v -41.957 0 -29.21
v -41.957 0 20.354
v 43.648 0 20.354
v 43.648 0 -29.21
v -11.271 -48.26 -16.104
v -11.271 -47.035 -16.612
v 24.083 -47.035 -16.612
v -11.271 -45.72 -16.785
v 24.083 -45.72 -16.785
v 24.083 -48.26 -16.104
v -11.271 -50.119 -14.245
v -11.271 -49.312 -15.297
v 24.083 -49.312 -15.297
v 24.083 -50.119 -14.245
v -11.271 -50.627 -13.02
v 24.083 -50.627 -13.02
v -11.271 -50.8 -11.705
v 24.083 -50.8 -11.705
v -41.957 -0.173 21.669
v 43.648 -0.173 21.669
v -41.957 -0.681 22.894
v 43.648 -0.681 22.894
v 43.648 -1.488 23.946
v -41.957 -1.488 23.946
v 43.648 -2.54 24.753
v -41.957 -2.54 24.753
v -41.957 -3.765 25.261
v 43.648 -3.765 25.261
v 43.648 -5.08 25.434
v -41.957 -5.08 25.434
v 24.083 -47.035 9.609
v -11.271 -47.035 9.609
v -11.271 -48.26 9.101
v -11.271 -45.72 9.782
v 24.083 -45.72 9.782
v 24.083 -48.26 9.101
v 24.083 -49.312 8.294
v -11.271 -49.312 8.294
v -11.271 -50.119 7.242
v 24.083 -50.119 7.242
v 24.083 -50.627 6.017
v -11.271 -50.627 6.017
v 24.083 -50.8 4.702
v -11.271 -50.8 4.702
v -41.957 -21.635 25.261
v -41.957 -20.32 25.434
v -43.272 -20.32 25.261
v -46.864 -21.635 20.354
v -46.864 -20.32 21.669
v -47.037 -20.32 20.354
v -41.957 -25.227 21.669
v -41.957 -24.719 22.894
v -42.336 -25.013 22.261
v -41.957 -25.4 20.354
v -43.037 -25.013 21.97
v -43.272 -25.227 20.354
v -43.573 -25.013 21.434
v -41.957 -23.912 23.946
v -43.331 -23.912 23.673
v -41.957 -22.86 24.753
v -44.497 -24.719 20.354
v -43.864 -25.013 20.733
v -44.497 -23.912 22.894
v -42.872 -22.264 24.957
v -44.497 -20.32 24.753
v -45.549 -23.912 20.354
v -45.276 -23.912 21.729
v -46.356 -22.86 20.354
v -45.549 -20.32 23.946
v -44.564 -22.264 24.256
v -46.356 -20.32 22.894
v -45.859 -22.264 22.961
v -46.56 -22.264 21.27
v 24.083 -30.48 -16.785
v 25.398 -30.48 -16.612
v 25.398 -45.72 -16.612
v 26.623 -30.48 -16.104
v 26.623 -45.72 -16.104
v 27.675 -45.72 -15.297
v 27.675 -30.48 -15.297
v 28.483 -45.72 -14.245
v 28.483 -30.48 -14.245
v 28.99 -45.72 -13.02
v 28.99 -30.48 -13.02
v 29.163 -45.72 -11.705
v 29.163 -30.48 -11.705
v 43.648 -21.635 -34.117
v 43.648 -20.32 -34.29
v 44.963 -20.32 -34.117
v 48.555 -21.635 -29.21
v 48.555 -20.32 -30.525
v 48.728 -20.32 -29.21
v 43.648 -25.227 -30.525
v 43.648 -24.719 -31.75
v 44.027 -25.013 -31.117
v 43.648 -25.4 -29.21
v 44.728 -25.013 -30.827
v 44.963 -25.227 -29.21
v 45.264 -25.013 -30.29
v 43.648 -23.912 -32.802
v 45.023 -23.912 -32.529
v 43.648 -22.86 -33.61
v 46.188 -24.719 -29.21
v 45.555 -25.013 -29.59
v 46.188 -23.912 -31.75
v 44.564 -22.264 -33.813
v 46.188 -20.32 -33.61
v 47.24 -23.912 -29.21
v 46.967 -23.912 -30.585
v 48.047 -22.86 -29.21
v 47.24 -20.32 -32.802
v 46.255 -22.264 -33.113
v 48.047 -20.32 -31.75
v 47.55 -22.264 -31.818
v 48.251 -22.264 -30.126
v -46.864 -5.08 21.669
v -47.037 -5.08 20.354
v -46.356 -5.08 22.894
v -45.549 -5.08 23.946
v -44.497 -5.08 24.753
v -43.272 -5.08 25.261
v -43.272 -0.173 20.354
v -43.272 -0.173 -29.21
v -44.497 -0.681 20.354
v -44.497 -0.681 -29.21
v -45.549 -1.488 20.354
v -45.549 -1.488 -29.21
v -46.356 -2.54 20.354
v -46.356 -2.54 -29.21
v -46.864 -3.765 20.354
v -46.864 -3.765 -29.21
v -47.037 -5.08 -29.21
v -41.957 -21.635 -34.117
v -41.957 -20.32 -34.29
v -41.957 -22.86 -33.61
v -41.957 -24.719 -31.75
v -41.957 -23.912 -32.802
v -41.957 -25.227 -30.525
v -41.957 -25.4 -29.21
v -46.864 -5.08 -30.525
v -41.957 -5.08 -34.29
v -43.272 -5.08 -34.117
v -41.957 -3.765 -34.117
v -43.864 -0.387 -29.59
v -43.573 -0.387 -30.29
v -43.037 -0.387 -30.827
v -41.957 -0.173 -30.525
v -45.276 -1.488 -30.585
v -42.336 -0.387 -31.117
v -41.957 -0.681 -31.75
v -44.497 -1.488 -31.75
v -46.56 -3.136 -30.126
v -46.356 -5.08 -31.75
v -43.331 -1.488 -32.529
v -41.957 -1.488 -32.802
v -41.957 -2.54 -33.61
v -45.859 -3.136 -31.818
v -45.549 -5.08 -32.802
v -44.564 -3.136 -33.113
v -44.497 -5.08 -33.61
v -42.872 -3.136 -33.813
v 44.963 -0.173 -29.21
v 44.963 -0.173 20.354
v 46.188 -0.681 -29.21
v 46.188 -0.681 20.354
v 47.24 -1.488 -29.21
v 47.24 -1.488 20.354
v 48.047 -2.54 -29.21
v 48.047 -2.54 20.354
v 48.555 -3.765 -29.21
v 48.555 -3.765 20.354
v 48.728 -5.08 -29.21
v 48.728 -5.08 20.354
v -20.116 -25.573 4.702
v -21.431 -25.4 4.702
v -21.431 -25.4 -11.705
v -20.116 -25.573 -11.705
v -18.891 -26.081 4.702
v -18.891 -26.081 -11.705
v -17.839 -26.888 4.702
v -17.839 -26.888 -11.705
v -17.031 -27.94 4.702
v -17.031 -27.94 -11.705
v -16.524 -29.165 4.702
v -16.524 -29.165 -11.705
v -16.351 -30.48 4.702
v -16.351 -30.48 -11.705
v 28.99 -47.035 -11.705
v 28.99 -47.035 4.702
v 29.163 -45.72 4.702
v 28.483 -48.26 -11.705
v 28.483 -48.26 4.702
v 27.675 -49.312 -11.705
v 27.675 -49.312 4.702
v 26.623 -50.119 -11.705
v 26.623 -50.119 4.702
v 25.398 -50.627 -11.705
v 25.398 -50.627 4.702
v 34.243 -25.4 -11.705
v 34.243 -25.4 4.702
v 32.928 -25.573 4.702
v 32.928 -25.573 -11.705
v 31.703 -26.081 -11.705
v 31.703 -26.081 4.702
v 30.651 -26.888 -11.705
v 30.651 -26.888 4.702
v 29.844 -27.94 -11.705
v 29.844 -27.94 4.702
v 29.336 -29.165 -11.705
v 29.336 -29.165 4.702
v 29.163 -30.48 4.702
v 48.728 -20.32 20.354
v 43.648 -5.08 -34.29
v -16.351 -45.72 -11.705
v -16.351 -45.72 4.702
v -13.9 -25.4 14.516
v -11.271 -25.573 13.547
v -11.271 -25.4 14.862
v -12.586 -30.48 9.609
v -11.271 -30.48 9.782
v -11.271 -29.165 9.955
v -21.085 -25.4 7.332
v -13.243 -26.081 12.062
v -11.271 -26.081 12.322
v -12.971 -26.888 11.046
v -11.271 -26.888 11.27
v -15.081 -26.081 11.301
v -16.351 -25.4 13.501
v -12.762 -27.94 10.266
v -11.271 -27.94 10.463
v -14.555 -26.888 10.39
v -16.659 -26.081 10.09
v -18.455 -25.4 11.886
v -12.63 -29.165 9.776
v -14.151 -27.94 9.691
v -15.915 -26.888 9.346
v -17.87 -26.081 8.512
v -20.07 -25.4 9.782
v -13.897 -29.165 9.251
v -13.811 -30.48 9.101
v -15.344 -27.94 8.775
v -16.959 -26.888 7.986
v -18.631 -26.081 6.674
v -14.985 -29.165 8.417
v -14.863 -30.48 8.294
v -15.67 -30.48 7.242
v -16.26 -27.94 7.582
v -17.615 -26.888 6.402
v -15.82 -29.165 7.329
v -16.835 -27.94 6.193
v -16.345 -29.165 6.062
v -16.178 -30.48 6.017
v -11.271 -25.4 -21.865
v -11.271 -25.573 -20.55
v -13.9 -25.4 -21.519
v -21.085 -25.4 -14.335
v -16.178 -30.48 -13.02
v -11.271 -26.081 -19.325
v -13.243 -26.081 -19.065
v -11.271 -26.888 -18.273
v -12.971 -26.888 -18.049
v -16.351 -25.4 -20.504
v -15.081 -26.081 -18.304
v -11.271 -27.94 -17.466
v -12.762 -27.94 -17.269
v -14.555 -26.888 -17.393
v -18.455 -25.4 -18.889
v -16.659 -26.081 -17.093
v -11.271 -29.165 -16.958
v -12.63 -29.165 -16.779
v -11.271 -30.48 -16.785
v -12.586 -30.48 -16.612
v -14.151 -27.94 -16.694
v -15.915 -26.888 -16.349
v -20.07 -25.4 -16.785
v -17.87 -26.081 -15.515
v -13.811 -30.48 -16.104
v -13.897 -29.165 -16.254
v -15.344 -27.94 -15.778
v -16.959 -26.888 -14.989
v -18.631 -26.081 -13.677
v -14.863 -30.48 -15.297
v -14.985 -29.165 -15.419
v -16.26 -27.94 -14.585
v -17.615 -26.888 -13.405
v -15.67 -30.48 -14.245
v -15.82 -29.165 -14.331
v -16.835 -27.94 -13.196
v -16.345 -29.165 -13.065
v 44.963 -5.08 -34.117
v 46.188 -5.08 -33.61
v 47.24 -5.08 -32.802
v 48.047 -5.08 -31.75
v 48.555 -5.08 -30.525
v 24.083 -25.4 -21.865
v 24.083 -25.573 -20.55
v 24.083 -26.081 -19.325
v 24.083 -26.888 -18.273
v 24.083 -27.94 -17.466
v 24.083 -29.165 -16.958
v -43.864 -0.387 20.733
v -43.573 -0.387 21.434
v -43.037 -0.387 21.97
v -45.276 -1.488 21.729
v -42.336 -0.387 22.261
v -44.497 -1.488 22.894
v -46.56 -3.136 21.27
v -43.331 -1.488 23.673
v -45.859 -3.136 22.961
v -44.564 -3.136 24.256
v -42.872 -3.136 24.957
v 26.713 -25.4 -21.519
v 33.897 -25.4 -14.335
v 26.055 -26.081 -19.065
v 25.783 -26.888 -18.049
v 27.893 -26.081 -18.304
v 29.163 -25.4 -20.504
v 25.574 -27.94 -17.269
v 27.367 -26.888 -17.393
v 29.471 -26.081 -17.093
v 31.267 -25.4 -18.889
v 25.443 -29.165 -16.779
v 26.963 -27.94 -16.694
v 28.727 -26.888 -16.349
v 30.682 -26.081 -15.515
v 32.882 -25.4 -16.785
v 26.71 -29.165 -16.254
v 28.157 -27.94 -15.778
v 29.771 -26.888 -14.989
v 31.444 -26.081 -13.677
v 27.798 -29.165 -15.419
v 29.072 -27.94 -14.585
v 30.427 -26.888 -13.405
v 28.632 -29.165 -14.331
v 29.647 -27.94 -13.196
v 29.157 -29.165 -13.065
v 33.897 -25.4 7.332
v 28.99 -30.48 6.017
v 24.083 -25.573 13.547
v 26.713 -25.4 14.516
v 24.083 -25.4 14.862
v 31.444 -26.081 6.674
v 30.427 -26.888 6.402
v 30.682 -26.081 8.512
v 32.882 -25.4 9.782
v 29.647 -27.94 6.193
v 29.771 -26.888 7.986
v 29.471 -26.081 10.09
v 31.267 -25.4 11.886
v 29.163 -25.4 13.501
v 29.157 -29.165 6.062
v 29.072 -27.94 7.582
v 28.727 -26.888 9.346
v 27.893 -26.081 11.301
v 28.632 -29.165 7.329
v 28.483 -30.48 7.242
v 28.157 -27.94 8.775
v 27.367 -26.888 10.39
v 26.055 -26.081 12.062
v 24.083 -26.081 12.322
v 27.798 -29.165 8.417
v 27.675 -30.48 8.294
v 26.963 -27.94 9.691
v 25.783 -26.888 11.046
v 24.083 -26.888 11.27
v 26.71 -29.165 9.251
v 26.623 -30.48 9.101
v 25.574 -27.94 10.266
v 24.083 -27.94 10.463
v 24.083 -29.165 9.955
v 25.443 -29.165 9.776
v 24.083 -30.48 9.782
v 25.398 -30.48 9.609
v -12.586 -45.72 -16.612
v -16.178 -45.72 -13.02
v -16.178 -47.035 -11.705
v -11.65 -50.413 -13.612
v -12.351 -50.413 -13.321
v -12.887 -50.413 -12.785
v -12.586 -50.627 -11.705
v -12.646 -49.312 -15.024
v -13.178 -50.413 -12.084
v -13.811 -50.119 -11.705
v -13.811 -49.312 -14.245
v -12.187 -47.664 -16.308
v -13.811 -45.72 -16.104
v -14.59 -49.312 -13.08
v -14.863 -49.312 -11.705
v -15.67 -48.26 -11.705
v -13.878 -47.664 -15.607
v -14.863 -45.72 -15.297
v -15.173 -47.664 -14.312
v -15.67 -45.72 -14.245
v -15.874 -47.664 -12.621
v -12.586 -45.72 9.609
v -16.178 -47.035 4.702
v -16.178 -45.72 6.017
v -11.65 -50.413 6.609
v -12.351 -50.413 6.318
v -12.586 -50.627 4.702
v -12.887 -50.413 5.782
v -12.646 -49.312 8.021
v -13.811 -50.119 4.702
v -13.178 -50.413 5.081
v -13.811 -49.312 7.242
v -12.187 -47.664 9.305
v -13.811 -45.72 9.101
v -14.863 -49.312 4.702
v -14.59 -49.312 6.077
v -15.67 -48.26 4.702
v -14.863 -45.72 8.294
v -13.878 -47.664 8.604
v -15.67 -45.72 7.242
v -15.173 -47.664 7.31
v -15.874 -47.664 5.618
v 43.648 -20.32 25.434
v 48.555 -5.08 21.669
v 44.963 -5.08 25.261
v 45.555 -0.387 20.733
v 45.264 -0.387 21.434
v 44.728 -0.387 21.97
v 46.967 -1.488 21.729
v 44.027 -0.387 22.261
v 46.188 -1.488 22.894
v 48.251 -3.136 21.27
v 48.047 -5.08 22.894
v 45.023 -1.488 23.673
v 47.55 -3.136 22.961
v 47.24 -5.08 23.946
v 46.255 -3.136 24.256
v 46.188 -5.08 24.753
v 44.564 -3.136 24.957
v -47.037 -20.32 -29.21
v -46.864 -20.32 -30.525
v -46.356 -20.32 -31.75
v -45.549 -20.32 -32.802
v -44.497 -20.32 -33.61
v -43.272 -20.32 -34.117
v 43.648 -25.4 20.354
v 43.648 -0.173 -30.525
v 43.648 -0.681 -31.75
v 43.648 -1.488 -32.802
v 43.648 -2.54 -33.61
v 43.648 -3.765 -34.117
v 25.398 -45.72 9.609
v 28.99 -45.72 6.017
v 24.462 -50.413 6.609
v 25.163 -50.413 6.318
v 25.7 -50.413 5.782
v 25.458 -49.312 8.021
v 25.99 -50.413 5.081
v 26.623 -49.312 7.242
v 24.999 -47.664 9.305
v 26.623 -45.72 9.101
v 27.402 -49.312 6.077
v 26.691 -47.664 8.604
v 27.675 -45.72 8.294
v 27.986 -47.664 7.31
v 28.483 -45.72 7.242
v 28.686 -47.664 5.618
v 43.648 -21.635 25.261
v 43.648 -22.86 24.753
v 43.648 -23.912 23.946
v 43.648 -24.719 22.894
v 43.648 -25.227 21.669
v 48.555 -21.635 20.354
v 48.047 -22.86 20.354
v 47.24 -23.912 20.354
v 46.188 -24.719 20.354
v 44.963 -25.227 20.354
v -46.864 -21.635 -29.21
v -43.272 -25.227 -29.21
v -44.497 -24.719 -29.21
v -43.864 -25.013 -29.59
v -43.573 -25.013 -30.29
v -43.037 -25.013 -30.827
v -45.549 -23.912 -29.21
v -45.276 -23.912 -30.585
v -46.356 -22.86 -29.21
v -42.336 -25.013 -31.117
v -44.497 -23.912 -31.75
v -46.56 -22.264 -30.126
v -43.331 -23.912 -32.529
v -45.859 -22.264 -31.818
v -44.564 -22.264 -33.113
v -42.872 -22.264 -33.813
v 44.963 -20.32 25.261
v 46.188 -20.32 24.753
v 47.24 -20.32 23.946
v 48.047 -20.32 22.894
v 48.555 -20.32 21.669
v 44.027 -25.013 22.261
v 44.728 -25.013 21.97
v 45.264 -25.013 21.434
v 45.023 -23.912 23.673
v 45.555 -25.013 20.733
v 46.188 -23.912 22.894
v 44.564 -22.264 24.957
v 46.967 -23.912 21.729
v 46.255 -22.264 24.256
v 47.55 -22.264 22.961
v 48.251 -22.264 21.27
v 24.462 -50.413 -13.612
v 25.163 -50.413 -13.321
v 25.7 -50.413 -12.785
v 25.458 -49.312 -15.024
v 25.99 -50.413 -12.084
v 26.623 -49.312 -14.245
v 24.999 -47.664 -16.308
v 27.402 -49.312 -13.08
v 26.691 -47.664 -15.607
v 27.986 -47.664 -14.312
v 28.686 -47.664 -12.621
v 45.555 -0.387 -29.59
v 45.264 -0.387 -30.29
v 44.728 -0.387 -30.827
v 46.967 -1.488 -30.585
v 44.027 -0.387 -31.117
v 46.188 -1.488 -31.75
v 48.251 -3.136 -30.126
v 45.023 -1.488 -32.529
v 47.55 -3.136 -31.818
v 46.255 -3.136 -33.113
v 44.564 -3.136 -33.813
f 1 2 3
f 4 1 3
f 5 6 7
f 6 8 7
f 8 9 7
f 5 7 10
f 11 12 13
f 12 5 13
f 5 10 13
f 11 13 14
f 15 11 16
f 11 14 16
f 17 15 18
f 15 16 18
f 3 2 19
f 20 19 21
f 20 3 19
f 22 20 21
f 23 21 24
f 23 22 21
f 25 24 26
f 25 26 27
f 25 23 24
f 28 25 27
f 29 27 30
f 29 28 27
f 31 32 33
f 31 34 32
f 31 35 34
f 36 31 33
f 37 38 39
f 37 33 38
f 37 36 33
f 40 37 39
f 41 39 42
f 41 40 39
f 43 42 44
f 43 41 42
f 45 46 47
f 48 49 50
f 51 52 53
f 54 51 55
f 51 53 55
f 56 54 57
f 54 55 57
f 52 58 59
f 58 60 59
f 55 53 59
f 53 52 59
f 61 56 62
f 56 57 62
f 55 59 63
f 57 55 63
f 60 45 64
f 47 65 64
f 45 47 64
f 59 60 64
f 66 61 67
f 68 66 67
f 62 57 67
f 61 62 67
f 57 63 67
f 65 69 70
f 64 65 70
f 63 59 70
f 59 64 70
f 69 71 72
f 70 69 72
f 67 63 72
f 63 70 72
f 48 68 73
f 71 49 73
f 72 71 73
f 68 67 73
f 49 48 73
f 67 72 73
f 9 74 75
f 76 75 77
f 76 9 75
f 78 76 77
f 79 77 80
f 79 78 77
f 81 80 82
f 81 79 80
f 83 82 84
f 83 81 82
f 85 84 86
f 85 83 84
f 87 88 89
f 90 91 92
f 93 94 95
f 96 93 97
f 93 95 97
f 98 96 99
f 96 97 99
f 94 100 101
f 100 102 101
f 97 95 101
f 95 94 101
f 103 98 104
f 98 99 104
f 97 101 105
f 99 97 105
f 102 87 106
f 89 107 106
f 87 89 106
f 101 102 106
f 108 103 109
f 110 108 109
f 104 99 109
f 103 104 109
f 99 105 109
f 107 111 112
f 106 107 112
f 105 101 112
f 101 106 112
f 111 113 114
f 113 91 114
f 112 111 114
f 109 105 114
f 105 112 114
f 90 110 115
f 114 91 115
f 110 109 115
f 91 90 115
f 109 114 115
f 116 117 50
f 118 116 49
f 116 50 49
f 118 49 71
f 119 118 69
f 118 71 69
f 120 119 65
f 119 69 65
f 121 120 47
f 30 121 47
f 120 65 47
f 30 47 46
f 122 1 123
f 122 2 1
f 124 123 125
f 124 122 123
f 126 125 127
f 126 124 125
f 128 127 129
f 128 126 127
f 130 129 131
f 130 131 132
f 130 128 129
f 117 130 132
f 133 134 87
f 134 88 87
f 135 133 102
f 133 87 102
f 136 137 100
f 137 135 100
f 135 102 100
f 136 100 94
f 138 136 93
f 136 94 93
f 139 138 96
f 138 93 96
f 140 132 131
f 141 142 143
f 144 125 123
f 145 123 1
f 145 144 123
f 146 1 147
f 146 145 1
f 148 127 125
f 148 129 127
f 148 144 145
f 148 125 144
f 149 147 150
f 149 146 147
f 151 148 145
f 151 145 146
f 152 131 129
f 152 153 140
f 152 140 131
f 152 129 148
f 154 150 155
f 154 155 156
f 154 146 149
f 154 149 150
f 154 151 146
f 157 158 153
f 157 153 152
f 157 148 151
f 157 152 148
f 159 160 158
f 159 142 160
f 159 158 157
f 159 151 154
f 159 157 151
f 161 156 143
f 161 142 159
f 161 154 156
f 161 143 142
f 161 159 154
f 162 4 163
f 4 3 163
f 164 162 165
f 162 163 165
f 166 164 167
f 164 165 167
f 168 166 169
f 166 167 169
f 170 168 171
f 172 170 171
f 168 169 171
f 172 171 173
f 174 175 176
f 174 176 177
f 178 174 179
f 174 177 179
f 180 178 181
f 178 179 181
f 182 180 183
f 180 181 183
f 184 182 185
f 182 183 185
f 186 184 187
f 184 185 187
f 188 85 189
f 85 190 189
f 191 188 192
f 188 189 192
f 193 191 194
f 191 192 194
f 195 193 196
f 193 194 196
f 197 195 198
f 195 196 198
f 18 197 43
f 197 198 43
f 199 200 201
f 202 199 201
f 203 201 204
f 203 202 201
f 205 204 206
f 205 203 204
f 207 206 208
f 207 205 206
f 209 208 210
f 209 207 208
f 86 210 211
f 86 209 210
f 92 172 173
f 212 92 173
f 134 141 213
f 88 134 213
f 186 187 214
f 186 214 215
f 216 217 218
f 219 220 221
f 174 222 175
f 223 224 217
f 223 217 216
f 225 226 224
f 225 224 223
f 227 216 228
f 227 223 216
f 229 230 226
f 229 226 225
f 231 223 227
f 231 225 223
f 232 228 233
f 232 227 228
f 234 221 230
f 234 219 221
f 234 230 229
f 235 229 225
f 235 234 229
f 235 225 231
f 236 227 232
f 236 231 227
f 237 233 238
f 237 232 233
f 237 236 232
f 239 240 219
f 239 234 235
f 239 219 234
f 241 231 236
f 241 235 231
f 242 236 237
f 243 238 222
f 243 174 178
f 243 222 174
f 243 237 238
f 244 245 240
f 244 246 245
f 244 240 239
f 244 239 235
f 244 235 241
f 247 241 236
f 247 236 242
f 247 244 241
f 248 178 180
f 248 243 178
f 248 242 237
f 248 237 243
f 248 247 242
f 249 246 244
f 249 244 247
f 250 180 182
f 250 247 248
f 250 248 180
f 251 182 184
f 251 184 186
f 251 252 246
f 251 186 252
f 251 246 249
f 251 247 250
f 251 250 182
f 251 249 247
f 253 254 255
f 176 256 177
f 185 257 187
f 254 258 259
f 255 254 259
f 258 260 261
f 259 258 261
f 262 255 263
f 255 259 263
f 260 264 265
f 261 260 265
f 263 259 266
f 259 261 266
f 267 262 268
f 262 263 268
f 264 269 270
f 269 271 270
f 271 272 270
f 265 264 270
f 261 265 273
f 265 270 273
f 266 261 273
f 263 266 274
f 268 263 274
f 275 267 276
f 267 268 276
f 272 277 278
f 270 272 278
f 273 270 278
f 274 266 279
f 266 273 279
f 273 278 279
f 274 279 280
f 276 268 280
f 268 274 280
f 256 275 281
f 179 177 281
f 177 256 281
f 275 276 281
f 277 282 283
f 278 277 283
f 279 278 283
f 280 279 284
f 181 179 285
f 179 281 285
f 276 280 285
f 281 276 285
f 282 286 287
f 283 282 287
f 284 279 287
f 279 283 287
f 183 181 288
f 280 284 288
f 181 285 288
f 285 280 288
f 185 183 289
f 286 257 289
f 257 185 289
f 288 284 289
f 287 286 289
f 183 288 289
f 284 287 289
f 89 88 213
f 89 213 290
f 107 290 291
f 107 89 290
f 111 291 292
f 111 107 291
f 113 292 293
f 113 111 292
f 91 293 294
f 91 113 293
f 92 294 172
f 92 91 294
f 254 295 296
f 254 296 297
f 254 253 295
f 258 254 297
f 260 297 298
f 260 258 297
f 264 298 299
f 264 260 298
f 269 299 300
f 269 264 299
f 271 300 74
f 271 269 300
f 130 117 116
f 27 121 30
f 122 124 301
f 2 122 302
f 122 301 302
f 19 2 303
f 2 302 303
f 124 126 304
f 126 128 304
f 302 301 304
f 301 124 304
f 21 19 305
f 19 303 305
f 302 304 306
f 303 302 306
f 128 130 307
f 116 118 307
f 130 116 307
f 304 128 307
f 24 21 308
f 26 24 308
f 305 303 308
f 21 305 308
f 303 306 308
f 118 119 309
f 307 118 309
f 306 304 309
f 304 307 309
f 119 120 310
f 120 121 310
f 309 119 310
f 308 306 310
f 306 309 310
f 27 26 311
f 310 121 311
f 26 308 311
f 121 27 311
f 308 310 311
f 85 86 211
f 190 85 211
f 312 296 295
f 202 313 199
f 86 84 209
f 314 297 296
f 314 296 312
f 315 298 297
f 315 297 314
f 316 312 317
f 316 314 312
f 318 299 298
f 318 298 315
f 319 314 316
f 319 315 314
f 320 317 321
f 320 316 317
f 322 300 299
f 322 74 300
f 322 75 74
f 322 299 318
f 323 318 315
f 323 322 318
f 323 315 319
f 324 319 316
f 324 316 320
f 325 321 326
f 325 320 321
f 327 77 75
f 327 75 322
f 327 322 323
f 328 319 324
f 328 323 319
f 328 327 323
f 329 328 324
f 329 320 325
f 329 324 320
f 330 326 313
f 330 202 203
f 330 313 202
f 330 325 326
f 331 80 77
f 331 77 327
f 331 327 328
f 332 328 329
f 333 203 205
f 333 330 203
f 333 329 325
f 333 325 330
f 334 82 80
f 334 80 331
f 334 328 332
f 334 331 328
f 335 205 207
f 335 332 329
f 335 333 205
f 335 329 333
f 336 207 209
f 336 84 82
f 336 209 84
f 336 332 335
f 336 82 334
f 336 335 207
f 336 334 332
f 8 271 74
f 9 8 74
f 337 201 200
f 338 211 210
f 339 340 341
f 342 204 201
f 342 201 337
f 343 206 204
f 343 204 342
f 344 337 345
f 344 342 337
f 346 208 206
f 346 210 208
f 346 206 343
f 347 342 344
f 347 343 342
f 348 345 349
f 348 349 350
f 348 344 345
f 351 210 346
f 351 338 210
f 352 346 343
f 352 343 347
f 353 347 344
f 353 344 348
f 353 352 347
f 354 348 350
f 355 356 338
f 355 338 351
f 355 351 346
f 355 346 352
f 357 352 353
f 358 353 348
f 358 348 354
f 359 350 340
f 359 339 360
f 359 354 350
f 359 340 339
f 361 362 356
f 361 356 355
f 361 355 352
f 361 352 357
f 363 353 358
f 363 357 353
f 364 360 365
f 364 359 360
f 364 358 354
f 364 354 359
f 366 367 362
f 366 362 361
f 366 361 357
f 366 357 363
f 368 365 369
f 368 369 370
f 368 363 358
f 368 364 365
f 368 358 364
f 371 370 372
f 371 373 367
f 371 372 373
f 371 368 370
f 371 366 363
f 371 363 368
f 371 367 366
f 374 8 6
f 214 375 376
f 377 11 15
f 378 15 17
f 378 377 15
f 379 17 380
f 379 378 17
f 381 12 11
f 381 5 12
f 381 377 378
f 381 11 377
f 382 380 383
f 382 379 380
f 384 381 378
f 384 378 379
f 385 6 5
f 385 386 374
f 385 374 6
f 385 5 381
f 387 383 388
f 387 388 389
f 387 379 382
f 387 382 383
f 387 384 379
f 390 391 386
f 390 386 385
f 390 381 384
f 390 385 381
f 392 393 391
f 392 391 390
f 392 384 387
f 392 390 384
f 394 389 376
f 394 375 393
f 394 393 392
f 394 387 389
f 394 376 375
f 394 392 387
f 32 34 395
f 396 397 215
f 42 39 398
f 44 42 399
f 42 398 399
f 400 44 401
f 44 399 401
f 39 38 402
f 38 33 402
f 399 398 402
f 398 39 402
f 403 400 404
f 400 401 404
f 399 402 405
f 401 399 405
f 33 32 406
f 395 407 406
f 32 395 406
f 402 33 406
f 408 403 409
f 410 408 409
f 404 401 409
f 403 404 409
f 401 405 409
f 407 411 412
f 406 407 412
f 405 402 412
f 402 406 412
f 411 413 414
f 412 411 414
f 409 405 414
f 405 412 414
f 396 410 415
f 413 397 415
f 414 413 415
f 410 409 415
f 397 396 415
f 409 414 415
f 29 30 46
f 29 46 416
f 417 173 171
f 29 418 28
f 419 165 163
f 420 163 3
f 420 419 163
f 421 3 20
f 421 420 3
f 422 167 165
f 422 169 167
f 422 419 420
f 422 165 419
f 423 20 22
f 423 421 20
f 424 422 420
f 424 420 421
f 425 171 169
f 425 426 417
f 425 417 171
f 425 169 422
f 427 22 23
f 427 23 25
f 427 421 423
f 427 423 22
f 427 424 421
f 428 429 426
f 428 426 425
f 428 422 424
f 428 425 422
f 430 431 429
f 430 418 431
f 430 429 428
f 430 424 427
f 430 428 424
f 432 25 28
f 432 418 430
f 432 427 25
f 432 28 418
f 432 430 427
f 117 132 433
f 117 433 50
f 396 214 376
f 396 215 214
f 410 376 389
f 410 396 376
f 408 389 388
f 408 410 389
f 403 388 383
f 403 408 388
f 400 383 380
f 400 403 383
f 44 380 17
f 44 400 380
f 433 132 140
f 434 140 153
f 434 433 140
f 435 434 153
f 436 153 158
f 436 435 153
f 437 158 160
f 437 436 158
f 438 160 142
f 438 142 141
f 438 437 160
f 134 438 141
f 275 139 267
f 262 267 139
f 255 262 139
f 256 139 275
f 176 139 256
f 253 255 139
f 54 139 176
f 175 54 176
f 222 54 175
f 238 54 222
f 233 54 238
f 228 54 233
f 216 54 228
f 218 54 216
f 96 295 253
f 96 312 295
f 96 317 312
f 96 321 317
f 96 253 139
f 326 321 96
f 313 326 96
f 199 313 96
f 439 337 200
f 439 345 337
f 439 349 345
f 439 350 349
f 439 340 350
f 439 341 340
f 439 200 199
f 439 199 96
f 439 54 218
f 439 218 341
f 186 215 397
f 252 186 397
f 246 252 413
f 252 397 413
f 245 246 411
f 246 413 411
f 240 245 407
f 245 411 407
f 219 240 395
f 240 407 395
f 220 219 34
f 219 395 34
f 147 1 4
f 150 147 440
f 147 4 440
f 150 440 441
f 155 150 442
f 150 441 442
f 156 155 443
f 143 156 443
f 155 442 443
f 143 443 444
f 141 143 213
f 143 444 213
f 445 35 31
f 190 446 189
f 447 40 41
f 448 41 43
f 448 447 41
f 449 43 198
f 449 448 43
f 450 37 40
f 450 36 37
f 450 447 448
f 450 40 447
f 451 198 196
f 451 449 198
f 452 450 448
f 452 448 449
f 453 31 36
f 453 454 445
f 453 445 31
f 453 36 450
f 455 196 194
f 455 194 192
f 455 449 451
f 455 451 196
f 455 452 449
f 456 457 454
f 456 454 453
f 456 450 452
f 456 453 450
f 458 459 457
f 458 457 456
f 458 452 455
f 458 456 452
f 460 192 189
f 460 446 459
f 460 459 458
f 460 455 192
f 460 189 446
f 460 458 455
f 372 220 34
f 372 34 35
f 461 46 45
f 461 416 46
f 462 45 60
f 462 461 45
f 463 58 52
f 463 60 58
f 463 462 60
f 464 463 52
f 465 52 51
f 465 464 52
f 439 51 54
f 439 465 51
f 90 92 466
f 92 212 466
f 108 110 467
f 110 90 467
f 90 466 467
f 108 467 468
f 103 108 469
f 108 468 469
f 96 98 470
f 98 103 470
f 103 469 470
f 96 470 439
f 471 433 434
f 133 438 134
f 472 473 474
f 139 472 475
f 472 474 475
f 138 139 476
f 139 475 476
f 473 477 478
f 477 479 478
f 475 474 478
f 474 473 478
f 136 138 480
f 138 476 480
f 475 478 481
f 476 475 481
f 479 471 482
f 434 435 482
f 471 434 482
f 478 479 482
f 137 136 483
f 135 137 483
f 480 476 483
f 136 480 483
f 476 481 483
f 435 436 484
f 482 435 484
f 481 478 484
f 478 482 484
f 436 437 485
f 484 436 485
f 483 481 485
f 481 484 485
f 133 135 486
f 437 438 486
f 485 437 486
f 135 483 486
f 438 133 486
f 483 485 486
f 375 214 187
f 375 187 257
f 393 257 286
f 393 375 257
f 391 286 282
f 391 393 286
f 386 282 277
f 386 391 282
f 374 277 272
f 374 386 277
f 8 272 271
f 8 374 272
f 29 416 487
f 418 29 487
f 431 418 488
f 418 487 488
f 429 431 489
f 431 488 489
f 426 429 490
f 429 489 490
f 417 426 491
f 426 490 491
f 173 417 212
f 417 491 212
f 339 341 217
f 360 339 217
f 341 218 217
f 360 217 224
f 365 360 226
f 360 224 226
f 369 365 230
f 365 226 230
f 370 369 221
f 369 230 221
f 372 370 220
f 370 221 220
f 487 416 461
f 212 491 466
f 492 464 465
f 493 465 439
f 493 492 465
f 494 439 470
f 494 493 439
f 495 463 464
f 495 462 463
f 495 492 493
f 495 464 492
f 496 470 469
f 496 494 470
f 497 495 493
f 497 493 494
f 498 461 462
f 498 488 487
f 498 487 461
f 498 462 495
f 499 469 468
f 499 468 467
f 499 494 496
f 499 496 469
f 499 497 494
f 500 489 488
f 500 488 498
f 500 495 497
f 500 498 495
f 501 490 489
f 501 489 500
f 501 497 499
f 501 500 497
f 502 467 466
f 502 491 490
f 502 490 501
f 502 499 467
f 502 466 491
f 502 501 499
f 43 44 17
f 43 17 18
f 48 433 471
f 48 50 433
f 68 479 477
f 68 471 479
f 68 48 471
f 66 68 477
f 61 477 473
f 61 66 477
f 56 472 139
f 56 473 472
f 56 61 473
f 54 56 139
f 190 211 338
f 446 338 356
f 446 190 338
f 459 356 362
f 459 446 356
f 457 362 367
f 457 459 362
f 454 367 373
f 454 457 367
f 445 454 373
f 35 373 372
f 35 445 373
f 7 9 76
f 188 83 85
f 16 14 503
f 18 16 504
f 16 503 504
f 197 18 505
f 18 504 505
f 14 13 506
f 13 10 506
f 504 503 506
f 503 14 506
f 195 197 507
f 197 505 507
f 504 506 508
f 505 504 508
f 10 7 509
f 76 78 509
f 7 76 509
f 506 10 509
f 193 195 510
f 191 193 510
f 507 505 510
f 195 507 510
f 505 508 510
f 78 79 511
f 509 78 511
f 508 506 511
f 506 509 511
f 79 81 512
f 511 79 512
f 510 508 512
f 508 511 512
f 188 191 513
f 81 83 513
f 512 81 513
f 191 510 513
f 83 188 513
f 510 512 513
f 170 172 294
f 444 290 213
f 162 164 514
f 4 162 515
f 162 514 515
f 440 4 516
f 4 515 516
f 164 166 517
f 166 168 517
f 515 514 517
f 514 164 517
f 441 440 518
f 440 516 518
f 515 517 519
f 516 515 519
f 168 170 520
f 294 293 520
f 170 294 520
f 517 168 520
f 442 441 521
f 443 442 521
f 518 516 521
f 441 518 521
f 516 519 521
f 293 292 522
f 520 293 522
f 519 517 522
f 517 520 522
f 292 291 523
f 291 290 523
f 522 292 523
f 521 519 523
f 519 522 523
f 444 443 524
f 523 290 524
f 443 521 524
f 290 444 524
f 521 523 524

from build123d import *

# Parameters (mm, degrees)
F0_W     = 95.7648605108
F0_H     = 59.7243234515
F1_DEPTH = 25.4
F2_W     = 45.5140545964
F2_H     = 26.5670269728
F3_DEPTH = 50.8
F4_R     = 5.08


with BuildPart() as f1:
    # F0 (on Front) → F1 (new body)
    with BuildSketch(Plane.XZ):
        with Locations((0.8455961943, -4.4281929731)):
            Rectangle(F0_W, F0_H)
    extrude(amount=F1_DEPTH)

    # F2 (on Front) → F3 (join)
    with BuildSketch(Plane.XZ):
        with Locations((6.4061377198, -3.5014376044)):
            Rectangle(F2_W, F2_H)
    extrude(amount=F3_DEPTH)

    # F4
    f4_edges = [f1.edges().sort_by_distance(p)[0] for p in [
        (-16.35089, -38.1, -16.784951),
        (29.163165, -38.1, -16.784951),
        (48.728026, -12.7, -34.290355),
        (-47.036834, -12.7, -34.290355),
        (48.728026, -12.7, 25.433969),
        (29.163165, -38.1, 9.782076),
        (-47.036834, -12.7, 25.433969),
        (-16.35089, -38.1, 9.782076),
        (6.406138, -50.8, 9.782076),
        (6.406138, -50.8, -16.784951),
        (0.845596, -25.4, 25.433969),
        (-47.036834, -25.4, -4.428193),
        (0.845596, -25.4, -34.290355),
        (-47.036834, 0, -4.428193),
        (48.728026, 0, -4.428193),
        (0.845596, 0, -34.290355),
        (0.845596, 0, 25.433969),
        (48.728026, -25.4, -4.428193),
        (29.163165, -50.8, -3.501438),
        (6.406138, -25.4, -16.784951),
        (29.163165, -25.4, -3.501438),
        (-16.35089, -50.8, -3.501438),
        (6.406138, -25.4, 9.782076),
        (-16.35089, -25.4, -3.501438),
    ]]
    fillet(f4_edges, radius=F4_R)


solid = f1.part
